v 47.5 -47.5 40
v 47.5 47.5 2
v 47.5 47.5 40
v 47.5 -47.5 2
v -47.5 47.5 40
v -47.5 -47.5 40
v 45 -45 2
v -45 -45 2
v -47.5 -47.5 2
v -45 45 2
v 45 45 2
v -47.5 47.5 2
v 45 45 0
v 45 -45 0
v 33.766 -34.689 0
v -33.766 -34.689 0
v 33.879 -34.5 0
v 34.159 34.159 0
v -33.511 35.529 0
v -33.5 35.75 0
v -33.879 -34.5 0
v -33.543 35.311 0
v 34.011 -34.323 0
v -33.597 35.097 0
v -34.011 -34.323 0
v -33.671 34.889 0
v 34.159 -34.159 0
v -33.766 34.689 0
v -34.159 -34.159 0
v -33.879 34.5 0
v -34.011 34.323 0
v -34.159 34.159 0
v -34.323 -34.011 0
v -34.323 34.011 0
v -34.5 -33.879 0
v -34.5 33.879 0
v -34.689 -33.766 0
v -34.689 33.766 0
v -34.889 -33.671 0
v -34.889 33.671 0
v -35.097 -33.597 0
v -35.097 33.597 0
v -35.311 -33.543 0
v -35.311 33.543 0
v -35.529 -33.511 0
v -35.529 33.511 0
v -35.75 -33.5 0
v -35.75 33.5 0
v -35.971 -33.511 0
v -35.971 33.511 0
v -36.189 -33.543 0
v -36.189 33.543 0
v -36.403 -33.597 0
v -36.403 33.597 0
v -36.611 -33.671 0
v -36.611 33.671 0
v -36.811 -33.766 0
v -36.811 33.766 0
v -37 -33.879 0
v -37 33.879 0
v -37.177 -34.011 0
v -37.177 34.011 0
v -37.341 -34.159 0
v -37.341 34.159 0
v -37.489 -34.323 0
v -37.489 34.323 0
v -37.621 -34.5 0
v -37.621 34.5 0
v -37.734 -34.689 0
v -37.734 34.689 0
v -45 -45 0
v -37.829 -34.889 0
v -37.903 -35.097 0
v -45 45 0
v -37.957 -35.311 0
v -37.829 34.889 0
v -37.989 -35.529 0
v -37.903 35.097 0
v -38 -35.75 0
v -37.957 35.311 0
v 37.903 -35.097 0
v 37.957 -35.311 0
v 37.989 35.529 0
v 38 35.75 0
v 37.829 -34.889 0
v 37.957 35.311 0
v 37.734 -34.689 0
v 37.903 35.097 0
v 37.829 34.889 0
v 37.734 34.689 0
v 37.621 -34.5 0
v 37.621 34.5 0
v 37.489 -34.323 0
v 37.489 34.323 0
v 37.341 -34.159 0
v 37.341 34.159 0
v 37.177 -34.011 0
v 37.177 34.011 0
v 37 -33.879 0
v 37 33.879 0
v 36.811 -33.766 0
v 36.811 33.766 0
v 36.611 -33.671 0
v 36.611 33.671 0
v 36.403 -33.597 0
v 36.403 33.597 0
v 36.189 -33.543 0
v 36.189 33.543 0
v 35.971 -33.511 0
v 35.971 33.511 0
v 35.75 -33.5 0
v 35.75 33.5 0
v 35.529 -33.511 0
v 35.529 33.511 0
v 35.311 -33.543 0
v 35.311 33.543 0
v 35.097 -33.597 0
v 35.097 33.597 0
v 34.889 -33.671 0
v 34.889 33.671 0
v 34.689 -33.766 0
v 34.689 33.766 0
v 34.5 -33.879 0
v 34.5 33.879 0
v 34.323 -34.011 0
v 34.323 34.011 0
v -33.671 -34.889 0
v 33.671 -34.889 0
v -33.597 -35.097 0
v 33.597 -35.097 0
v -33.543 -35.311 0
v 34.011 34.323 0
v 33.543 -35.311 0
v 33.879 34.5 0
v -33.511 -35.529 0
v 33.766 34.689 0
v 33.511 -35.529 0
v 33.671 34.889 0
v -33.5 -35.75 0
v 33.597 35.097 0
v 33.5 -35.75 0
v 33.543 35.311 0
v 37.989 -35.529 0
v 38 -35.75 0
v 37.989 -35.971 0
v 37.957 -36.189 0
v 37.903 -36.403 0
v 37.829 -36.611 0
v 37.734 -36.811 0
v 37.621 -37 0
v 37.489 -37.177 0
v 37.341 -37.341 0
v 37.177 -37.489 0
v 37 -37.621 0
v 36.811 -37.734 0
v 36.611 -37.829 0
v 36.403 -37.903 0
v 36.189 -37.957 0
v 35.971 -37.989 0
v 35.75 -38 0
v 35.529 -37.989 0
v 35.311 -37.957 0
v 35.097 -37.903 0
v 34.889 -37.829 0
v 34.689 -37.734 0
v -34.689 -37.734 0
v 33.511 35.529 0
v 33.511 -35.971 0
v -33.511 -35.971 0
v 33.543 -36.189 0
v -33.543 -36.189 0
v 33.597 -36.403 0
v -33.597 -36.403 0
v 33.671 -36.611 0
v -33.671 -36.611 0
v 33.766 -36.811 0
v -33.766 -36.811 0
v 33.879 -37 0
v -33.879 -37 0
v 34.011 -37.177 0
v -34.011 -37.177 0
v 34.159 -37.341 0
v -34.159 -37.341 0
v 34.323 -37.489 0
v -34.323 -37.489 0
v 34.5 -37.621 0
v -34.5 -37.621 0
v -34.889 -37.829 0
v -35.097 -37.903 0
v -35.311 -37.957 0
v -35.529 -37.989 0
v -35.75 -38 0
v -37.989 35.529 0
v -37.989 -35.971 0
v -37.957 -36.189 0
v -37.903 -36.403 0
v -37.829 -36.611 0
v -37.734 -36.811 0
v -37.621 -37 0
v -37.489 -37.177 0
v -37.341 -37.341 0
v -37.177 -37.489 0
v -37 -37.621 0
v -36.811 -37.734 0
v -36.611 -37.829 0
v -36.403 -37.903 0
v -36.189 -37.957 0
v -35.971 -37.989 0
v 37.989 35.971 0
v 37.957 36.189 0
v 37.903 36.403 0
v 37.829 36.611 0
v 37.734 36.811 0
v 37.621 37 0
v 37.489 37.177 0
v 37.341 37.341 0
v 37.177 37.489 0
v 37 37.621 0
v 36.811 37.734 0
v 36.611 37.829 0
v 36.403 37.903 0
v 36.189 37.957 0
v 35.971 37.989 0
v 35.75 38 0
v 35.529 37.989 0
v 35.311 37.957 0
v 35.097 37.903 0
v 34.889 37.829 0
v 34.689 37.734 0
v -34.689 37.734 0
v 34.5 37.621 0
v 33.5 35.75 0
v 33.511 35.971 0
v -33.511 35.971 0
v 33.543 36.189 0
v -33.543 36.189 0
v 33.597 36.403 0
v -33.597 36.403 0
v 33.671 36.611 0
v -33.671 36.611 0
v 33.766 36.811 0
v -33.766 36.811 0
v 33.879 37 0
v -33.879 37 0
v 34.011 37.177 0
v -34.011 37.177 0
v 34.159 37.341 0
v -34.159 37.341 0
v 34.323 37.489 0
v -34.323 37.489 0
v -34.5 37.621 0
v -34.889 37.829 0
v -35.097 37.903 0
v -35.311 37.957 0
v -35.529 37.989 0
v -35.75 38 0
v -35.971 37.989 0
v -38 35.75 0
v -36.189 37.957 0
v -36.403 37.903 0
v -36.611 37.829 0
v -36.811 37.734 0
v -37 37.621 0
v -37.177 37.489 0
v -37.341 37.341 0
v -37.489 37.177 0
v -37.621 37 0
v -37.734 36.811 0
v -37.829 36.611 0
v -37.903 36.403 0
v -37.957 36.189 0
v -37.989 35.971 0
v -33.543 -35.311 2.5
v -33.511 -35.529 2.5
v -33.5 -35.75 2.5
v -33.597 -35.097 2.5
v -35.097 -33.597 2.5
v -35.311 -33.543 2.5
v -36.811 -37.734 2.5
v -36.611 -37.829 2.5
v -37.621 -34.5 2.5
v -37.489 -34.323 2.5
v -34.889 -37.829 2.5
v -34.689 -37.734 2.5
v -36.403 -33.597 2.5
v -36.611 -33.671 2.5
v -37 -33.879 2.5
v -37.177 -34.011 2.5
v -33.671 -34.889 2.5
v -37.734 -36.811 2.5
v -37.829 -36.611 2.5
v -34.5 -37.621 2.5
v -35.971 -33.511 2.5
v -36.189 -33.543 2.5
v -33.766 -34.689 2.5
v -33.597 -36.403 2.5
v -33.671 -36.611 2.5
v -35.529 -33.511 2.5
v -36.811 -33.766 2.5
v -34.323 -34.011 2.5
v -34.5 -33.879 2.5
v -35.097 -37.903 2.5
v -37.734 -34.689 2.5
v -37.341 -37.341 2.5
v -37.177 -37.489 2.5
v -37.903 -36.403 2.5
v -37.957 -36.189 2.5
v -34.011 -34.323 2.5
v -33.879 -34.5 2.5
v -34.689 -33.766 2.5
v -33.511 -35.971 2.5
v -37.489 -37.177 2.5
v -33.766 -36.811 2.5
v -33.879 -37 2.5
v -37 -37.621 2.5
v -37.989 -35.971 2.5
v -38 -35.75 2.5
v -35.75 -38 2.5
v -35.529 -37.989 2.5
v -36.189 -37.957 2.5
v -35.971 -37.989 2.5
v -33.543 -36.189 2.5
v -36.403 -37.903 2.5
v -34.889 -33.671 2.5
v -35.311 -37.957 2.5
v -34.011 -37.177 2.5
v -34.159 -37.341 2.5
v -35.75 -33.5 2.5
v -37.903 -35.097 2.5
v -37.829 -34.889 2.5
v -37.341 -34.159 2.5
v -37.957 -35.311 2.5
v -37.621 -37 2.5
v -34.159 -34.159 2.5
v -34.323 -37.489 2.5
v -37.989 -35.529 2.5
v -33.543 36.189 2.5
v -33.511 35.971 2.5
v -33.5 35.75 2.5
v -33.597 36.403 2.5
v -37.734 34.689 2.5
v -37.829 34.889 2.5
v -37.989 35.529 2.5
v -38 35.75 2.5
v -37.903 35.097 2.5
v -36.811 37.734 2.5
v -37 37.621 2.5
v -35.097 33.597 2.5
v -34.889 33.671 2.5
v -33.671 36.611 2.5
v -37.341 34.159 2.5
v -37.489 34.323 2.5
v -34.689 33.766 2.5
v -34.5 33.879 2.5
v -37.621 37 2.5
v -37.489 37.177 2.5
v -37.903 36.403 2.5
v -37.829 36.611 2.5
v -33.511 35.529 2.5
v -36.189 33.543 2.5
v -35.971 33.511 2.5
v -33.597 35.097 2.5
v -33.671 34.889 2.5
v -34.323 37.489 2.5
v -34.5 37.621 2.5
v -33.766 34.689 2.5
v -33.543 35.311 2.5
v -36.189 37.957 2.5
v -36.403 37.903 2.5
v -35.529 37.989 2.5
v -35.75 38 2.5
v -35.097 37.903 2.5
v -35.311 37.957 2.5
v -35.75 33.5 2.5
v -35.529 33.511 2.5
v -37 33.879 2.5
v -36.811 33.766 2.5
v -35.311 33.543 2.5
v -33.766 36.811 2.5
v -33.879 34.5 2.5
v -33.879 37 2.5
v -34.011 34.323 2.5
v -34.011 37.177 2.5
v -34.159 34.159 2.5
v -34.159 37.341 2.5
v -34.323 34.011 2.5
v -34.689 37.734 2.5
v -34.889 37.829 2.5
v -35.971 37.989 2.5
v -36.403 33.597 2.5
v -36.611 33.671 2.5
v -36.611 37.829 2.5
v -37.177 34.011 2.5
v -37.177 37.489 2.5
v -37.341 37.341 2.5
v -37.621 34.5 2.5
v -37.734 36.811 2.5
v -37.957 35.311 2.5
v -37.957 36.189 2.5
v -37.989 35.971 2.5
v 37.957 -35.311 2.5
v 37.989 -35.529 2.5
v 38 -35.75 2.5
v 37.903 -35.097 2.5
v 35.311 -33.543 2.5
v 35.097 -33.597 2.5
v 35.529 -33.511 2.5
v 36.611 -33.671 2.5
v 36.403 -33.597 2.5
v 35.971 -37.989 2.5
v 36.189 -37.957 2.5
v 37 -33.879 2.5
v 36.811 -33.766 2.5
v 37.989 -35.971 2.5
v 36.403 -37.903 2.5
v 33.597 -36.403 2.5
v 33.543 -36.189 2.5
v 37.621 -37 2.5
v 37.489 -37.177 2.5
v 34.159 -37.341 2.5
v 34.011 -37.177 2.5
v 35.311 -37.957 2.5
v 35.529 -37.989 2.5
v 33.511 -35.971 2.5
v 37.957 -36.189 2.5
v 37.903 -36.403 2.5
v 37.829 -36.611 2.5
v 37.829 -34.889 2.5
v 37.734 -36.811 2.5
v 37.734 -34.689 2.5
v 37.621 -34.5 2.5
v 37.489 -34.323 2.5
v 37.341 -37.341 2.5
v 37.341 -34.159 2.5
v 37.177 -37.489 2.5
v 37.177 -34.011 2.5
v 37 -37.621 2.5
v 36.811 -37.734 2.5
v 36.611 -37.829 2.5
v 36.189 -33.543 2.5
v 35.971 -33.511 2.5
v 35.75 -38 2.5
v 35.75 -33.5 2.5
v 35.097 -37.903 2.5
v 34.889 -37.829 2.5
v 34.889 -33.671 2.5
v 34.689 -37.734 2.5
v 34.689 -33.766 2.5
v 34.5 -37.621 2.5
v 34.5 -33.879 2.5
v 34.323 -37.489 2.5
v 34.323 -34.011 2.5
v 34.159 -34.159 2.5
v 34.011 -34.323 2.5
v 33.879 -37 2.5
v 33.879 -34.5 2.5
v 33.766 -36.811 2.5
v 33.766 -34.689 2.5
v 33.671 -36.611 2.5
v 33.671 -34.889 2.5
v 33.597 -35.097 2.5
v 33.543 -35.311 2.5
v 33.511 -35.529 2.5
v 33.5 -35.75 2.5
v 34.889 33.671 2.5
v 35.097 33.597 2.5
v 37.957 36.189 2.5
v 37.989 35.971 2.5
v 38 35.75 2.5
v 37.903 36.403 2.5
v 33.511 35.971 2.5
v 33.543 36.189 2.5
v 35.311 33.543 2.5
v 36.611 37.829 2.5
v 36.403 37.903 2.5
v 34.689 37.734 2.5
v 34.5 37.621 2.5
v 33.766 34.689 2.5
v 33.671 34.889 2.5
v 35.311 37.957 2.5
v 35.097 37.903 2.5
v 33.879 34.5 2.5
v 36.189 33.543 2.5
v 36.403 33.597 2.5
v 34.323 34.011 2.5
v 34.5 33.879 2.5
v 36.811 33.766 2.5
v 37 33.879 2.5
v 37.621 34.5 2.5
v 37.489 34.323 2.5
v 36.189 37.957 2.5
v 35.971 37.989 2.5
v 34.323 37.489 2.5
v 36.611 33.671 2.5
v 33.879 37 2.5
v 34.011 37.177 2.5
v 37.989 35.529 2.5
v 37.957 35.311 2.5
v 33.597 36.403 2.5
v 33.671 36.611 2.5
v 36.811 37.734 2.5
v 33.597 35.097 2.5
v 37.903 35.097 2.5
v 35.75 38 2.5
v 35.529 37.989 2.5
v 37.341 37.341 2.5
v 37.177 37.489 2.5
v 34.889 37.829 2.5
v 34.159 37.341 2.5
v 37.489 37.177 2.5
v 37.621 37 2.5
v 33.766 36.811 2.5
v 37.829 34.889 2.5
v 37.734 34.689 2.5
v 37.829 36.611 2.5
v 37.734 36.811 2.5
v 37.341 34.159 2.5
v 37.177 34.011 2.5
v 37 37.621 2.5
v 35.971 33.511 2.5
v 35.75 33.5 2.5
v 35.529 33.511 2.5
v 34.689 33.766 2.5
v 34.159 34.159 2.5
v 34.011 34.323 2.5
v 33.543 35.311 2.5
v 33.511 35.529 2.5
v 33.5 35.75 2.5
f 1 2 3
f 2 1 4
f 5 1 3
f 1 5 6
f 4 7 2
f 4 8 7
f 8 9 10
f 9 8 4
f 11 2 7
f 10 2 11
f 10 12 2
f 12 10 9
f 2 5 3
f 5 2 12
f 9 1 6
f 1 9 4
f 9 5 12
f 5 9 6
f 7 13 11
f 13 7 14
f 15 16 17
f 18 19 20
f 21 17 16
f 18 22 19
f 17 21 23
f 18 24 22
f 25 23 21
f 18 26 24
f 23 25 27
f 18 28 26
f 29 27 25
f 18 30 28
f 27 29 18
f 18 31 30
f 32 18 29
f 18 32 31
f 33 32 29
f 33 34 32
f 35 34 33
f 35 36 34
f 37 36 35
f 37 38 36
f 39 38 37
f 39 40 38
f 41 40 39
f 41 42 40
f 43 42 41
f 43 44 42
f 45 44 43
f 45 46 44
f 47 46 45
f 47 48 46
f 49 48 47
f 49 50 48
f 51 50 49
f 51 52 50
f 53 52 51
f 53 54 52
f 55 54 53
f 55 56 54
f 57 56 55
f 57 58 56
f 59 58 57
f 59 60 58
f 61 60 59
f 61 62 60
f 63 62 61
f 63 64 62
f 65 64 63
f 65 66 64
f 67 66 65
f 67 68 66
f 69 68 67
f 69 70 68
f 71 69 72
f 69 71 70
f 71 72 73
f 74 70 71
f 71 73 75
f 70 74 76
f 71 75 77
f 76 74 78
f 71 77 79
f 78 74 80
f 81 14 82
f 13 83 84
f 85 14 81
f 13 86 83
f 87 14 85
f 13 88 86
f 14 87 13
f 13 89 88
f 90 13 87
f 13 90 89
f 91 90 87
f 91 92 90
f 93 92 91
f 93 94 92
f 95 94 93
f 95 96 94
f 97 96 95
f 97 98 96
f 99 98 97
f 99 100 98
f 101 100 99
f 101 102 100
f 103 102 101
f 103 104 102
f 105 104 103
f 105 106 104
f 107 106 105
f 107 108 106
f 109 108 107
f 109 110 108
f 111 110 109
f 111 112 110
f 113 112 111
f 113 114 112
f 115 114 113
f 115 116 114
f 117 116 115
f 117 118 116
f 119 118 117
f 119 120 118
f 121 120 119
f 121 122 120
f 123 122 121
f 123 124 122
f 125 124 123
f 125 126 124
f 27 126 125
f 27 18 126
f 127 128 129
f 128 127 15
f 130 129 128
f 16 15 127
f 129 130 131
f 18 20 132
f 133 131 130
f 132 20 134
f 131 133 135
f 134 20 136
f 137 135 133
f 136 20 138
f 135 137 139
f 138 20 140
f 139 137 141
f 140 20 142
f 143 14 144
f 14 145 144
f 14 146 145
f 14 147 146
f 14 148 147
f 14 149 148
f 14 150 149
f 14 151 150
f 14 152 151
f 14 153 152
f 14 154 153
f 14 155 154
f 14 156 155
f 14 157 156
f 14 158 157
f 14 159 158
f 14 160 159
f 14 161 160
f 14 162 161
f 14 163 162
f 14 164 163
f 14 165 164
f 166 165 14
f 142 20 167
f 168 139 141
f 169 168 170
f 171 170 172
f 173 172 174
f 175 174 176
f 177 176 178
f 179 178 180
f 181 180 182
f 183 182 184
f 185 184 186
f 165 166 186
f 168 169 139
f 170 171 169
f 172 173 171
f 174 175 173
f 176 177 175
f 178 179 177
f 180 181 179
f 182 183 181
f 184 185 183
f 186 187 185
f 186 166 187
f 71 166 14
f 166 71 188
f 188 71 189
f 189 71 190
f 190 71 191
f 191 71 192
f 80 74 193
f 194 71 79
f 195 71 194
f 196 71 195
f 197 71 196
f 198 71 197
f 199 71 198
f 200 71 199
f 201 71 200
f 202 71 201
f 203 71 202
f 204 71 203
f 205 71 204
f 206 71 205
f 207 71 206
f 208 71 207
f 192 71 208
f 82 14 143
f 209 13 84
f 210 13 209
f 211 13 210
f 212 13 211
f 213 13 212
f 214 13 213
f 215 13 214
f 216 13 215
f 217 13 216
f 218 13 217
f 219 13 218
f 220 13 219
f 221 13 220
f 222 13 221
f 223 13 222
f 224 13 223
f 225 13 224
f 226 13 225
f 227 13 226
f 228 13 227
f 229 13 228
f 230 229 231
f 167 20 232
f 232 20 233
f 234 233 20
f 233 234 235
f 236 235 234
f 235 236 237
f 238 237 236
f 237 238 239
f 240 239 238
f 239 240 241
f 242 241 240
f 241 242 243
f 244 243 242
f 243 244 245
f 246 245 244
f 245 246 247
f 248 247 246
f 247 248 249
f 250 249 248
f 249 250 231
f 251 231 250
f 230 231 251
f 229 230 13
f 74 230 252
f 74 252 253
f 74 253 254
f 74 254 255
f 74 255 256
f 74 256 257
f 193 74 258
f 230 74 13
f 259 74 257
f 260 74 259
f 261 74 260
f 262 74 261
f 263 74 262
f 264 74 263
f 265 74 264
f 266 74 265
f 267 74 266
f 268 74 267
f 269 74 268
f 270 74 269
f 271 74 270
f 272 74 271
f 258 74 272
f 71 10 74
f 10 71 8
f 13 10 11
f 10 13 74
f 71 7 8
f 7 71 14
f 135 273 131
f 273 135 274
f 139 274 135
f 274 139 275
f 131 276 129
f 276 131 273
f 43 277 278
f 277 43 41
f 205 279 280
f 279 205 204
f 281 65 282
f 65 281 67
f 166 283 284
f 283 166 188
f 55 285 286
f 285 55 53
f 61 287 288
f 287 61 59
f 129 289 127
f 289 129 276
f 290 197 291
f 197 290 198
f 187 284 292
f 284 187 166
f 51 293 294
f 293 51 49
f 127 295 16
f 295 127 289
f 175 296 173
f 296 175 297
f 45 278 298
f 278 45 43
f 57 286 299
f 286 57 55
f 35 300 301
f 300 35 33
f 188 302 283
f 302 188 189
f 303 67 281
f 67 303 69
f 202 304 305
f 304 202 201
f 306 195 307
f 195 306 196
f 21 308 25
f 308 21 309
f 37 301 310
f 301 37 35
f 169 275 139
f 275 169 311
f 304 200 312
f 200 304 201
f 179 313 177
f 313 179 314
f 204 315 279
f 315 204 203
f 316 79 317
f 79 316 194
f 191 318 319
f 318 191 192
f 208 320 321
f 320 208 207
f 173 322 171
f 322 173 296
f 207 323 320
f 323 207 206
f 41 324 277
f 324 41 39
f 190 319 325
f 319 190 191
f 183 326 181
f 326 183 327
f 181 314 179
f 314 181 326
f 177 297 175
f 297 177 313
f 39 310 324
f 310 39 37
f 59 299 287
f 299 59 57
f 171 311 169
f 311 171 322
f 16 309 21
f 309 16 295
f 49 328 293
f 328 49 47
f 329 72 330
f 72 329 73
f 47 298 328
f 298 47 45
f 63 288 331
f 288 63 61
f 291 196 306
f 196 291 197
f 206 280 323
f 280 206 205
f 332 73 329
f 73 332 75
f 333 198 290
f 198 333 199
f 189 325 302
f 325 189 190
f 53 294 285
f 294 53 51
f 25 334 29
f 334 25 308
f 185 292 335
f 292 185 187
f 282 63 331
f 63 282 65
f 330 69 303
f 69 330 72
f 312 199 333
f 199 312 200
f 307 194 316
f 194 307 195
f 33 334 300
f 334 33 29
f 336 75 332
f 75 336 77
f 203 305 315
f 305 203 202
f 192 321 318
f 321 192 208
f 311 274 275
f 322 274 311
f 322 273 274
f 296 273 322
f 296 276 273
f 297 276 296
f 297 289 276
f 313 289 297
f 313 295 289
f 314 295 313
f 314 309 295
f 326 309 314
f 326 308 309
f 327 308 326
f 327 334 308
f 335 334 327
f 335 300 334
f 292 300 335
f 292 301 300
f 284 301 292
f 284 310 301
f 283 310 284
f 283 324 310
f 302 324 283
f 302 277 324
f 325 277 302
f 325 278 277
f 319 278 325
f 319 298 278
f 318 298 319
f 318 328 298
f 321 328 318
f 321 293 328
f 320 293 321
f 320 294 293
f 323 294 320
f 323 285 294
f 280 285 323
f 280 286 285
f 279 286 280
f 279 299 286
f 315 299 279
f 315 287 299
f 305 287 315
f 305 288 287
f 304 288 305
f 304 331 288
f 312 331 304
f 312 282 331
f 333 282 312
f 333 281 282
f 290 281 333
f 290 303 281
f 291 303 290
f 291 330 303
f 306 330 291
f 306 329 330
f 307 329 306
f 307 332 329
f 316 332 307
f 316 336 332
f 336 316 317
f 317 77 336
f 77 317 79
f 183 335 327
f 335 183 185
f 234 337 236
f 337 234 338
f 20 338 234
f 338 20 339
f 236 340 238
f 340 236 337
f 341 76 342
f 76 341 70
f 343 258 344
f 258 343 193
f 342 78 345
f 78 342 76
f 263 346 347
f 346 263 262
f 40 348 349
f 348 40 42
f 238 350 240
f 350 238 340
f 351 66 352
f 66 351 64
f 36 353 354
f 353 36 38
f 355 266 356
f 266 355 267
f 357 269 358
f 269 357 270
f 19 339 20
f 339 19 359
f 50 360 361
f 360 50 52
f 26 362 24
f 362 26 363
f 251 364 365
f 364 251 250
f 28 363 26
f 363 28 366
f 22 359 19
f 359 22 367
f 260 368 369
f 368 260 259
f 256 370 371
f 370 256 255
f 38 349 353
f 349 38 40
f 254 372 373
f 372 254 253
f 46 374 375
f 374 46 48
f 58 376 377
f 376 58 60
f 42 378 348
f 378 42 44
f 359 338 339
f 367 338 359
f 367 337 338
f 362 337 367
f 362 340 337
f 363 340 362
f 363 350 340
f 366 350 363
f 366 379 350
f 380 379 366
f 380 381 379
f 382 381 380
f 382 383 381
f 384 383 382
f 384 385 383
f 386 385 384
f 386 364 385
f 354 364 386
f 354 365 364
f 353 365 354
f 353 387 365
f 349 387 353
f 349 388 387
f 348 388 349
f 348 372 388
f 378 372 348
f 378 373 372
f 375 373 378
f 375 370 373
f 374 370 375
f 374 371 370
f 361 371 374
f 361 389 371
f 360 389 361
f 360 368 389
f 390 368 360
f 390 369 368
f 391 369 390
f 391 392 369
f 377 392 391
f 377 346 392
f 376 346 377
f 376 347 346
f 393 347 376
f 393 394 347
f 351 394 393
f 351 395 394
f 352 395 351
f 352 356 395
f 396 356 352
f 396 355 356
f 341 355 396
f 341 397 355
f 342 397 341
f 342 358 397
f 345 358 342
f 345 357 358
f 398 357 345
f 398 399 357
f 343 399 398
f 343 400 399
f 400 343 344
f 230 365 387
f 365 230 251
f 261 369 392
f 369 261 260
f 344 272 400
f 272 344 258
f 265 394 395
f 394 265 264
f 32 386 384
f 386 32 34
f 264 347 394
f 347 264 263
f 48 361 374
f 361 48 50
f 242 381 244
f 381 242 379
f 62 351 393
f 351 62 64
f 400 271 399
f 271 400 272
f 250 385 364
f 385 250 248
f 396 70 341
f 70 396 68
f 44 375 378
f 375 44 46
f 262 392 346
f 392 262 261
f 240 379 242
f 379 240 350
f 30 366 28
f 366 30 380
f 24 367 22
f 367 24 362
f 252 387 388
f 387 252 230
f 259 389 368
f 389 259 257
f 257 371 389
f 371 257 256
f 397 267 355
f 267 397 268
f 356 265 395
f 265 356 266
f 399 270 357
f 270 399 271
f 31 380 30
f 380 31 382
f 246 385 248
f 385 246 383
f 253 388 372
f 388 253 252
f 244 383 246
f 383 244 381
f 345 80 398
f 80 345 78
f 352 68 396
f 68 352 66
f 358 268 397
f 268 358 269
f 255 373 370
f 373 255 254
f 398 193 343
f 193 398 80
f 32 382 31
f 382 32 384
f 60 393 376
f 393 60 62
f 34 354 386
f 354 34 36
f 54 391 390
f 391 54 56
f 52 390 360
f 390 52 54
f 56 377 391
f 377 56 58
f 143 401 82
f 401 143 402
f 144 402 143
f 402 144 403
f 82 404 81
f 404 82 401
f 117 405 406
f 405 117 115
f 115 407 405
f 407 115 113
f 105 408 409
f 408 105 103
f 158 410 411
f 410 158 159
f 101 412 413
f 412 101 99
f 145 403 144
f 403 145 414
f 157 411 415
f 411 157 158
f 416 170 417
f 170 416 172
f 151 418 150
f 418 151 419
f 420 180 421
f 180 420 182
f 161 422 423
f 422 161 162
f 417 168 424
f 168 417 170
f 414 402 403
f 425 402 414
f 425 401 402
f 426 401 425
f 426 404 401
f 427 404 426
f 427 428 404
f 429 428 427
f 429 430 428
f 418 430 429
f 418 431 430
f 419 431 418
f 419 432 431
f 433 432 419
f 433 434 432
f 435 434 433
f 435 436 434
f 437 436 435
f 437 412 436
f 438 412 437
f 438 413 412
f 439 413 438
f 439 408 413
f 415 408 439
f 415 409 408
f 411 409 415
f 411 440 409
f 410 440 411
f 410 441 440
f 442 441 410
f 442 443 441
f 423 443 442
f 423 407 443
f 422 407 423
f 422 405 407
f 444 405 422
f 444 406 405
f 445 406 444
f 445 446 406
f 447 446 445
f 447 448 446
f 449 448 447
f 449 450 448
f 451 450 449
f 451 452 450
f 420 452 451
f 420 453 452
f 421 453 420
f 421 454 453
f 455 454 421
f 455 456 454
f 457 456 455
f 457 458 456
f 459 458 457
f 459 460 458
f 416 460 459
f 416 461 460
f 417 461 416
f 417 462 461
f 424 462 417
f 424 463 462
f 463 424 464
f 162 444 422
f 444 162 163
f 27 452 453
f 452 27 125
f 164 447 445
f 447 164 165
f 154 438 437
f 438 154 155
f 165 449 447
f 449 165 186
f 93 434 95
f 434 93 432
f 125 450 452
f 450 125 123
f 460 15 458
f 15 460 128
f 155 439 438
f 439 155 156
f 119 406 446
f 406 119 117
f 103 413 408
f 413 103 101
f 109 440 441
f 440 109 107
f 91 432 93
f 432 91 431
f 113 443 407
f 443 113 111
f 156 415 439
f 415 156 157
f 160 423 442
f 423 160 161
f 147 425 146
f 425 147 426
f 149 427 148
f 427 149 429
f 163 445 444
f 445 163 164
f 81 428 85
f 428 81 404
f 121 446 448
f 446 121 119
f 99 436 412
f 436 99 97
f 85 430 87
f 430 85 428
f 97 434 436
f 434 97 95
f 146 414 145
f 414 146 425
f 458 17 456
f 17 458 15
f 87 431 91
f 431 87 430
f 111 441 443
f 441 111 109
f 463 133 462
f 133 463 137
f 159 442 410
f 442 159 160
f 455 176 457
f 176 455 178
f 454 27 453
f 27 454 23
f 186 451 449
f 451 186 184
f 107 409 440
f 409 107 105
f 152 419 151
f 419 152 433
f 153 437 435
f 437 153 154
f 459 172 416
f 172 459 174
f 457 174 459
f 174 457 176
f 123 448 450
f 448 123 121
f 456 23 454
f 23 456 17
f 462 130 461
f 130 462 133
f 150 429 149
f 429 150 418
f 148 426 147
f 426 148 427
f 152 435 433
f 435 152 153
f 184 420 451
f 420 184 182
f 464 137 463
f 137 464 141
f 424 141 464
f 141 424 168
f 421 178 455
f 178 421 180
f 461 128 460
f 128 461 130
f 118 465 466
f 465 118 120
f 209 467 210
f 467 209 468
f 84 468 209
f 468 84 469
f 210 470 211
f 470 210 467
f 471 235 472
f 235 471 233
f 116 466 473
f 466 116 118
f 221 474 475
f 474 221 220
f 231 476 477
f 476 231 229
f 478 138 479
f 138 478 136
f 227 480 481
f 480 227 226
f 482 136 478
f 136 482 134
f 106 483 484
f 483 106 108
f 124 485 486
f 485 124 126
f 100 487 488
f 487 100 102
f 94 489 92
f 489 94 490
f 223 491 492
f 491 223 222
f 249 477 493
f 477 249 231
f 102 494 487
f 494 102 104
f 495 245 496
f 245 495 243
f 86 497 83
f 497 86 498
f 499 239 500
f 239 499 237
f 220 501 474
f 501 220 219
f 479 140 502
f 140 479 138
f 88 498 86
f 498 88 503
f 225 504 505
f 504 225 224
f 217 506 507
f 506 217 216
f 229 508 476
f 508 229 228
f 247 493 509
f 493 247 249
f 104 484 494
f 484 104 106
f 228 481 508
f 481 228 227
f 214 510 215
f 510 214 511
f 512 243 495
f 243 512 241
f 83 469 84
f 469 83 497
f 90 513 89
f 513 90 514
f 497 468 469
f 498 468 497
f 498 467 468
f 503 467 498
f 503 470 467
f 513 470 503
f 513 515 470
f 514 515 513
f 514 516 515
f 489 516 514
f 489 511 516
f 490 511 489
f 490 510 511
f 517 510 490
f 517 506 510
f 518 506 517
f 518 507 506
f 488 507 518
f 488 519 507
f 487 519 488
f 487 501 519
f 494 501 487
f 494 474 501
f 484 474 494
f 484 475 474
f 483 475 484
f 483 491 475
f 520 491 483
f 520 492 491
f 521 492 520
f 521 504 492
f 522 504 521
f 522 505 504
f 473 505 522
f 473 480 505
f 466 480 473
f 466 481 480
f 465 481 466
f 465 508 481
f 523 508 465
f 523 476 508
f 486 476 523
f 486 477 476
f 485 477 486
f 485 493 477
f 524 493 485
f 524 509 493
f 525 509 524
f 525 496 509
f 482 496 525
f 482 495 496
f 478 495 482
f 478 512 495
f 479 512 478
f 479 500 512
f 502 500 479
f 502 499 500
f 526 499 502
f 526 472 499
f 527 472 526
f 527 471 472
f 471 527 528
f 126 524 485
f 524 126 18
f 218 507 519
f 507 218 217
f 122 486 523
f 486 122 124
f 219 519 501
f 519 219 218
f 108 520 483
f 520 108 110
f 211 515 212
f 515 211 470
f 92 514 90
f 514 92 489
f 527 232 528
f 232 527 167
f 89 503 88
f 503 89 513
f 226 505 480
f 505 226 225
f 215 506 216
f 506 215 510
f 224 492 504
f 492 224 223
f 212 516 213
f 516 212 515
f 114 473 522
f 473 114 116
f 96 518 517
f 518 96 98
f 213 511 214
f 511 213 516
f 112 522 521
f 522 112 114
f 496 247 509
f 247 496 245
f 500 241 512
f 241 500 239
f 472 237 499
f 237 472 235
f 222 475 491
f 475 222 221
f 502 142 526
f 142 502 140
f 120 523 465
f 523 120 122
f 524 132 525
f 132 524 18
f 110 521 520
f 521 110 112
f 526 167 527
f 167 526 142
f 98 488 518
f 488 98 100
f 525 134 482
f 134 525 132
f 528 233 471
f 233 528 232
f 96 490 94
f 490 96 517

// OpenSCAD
// Magnetic stirrer housing for 80 mm PC case fan
// Print orientation: top plate on bed (z = 0), walls rise to open top (z = 40)

$fn = 64;

// --- Dimensions (mm) ---
plate_t      = 2;     // top plate thickness
wall_t       = 2.5;   // wall thickness
box_h        = 40;    // total height (open top at z = 40)
outer        = 90;    // outer size in X and Y
screw        = 4.5;   // M4 screw hole diameter
screw_pitch  = 71.5;  // square pattern size for screw holes
notch_w      = 12;    // cable notch width
notch_bottom = 8;     // notch depth from open edge (z = 32 to 40)
eps          = 0.5;   // cutter overshoot

// --- Model ---
difference() {
    union() {
        // Top plate
        translate([-outer/2, -outer/2, 0])
            cube([outer, outer, plate_t]);

        // Walls (open top)
        for (a = [0, 90, 180, 270])
            rotate([0, 0, a])
                translate([0, -outer/2 - wall_t, plate_t])
                    cube([outer/2 + wall_t, outer + 2*wall_t, box_h - plate_t]);
    }

    // Screw holes through top plate
    for (x = [-screw_pitch/2, screw_pitch/2])
        for (y = [-screw_pitch/2, screw_pitch/2])
            translate([x, y, -eps])
                cylinder(d = screw, h = plate_t + 2*eps);

    // Cable notch in one wall (z = 32 to 40)
    translate([-outer/2 - wall_t, 0, plate_t])
        rotate([90, 0, 0])
            difference() {
                cube([outer/2 + wall_t, notch_w, notch_bottom]);
                translate([0, -eps, 0])
                    cube([outer/2 + wall_t, notch_w + 2*eps, notch_bottom + eps]);
            }
}
